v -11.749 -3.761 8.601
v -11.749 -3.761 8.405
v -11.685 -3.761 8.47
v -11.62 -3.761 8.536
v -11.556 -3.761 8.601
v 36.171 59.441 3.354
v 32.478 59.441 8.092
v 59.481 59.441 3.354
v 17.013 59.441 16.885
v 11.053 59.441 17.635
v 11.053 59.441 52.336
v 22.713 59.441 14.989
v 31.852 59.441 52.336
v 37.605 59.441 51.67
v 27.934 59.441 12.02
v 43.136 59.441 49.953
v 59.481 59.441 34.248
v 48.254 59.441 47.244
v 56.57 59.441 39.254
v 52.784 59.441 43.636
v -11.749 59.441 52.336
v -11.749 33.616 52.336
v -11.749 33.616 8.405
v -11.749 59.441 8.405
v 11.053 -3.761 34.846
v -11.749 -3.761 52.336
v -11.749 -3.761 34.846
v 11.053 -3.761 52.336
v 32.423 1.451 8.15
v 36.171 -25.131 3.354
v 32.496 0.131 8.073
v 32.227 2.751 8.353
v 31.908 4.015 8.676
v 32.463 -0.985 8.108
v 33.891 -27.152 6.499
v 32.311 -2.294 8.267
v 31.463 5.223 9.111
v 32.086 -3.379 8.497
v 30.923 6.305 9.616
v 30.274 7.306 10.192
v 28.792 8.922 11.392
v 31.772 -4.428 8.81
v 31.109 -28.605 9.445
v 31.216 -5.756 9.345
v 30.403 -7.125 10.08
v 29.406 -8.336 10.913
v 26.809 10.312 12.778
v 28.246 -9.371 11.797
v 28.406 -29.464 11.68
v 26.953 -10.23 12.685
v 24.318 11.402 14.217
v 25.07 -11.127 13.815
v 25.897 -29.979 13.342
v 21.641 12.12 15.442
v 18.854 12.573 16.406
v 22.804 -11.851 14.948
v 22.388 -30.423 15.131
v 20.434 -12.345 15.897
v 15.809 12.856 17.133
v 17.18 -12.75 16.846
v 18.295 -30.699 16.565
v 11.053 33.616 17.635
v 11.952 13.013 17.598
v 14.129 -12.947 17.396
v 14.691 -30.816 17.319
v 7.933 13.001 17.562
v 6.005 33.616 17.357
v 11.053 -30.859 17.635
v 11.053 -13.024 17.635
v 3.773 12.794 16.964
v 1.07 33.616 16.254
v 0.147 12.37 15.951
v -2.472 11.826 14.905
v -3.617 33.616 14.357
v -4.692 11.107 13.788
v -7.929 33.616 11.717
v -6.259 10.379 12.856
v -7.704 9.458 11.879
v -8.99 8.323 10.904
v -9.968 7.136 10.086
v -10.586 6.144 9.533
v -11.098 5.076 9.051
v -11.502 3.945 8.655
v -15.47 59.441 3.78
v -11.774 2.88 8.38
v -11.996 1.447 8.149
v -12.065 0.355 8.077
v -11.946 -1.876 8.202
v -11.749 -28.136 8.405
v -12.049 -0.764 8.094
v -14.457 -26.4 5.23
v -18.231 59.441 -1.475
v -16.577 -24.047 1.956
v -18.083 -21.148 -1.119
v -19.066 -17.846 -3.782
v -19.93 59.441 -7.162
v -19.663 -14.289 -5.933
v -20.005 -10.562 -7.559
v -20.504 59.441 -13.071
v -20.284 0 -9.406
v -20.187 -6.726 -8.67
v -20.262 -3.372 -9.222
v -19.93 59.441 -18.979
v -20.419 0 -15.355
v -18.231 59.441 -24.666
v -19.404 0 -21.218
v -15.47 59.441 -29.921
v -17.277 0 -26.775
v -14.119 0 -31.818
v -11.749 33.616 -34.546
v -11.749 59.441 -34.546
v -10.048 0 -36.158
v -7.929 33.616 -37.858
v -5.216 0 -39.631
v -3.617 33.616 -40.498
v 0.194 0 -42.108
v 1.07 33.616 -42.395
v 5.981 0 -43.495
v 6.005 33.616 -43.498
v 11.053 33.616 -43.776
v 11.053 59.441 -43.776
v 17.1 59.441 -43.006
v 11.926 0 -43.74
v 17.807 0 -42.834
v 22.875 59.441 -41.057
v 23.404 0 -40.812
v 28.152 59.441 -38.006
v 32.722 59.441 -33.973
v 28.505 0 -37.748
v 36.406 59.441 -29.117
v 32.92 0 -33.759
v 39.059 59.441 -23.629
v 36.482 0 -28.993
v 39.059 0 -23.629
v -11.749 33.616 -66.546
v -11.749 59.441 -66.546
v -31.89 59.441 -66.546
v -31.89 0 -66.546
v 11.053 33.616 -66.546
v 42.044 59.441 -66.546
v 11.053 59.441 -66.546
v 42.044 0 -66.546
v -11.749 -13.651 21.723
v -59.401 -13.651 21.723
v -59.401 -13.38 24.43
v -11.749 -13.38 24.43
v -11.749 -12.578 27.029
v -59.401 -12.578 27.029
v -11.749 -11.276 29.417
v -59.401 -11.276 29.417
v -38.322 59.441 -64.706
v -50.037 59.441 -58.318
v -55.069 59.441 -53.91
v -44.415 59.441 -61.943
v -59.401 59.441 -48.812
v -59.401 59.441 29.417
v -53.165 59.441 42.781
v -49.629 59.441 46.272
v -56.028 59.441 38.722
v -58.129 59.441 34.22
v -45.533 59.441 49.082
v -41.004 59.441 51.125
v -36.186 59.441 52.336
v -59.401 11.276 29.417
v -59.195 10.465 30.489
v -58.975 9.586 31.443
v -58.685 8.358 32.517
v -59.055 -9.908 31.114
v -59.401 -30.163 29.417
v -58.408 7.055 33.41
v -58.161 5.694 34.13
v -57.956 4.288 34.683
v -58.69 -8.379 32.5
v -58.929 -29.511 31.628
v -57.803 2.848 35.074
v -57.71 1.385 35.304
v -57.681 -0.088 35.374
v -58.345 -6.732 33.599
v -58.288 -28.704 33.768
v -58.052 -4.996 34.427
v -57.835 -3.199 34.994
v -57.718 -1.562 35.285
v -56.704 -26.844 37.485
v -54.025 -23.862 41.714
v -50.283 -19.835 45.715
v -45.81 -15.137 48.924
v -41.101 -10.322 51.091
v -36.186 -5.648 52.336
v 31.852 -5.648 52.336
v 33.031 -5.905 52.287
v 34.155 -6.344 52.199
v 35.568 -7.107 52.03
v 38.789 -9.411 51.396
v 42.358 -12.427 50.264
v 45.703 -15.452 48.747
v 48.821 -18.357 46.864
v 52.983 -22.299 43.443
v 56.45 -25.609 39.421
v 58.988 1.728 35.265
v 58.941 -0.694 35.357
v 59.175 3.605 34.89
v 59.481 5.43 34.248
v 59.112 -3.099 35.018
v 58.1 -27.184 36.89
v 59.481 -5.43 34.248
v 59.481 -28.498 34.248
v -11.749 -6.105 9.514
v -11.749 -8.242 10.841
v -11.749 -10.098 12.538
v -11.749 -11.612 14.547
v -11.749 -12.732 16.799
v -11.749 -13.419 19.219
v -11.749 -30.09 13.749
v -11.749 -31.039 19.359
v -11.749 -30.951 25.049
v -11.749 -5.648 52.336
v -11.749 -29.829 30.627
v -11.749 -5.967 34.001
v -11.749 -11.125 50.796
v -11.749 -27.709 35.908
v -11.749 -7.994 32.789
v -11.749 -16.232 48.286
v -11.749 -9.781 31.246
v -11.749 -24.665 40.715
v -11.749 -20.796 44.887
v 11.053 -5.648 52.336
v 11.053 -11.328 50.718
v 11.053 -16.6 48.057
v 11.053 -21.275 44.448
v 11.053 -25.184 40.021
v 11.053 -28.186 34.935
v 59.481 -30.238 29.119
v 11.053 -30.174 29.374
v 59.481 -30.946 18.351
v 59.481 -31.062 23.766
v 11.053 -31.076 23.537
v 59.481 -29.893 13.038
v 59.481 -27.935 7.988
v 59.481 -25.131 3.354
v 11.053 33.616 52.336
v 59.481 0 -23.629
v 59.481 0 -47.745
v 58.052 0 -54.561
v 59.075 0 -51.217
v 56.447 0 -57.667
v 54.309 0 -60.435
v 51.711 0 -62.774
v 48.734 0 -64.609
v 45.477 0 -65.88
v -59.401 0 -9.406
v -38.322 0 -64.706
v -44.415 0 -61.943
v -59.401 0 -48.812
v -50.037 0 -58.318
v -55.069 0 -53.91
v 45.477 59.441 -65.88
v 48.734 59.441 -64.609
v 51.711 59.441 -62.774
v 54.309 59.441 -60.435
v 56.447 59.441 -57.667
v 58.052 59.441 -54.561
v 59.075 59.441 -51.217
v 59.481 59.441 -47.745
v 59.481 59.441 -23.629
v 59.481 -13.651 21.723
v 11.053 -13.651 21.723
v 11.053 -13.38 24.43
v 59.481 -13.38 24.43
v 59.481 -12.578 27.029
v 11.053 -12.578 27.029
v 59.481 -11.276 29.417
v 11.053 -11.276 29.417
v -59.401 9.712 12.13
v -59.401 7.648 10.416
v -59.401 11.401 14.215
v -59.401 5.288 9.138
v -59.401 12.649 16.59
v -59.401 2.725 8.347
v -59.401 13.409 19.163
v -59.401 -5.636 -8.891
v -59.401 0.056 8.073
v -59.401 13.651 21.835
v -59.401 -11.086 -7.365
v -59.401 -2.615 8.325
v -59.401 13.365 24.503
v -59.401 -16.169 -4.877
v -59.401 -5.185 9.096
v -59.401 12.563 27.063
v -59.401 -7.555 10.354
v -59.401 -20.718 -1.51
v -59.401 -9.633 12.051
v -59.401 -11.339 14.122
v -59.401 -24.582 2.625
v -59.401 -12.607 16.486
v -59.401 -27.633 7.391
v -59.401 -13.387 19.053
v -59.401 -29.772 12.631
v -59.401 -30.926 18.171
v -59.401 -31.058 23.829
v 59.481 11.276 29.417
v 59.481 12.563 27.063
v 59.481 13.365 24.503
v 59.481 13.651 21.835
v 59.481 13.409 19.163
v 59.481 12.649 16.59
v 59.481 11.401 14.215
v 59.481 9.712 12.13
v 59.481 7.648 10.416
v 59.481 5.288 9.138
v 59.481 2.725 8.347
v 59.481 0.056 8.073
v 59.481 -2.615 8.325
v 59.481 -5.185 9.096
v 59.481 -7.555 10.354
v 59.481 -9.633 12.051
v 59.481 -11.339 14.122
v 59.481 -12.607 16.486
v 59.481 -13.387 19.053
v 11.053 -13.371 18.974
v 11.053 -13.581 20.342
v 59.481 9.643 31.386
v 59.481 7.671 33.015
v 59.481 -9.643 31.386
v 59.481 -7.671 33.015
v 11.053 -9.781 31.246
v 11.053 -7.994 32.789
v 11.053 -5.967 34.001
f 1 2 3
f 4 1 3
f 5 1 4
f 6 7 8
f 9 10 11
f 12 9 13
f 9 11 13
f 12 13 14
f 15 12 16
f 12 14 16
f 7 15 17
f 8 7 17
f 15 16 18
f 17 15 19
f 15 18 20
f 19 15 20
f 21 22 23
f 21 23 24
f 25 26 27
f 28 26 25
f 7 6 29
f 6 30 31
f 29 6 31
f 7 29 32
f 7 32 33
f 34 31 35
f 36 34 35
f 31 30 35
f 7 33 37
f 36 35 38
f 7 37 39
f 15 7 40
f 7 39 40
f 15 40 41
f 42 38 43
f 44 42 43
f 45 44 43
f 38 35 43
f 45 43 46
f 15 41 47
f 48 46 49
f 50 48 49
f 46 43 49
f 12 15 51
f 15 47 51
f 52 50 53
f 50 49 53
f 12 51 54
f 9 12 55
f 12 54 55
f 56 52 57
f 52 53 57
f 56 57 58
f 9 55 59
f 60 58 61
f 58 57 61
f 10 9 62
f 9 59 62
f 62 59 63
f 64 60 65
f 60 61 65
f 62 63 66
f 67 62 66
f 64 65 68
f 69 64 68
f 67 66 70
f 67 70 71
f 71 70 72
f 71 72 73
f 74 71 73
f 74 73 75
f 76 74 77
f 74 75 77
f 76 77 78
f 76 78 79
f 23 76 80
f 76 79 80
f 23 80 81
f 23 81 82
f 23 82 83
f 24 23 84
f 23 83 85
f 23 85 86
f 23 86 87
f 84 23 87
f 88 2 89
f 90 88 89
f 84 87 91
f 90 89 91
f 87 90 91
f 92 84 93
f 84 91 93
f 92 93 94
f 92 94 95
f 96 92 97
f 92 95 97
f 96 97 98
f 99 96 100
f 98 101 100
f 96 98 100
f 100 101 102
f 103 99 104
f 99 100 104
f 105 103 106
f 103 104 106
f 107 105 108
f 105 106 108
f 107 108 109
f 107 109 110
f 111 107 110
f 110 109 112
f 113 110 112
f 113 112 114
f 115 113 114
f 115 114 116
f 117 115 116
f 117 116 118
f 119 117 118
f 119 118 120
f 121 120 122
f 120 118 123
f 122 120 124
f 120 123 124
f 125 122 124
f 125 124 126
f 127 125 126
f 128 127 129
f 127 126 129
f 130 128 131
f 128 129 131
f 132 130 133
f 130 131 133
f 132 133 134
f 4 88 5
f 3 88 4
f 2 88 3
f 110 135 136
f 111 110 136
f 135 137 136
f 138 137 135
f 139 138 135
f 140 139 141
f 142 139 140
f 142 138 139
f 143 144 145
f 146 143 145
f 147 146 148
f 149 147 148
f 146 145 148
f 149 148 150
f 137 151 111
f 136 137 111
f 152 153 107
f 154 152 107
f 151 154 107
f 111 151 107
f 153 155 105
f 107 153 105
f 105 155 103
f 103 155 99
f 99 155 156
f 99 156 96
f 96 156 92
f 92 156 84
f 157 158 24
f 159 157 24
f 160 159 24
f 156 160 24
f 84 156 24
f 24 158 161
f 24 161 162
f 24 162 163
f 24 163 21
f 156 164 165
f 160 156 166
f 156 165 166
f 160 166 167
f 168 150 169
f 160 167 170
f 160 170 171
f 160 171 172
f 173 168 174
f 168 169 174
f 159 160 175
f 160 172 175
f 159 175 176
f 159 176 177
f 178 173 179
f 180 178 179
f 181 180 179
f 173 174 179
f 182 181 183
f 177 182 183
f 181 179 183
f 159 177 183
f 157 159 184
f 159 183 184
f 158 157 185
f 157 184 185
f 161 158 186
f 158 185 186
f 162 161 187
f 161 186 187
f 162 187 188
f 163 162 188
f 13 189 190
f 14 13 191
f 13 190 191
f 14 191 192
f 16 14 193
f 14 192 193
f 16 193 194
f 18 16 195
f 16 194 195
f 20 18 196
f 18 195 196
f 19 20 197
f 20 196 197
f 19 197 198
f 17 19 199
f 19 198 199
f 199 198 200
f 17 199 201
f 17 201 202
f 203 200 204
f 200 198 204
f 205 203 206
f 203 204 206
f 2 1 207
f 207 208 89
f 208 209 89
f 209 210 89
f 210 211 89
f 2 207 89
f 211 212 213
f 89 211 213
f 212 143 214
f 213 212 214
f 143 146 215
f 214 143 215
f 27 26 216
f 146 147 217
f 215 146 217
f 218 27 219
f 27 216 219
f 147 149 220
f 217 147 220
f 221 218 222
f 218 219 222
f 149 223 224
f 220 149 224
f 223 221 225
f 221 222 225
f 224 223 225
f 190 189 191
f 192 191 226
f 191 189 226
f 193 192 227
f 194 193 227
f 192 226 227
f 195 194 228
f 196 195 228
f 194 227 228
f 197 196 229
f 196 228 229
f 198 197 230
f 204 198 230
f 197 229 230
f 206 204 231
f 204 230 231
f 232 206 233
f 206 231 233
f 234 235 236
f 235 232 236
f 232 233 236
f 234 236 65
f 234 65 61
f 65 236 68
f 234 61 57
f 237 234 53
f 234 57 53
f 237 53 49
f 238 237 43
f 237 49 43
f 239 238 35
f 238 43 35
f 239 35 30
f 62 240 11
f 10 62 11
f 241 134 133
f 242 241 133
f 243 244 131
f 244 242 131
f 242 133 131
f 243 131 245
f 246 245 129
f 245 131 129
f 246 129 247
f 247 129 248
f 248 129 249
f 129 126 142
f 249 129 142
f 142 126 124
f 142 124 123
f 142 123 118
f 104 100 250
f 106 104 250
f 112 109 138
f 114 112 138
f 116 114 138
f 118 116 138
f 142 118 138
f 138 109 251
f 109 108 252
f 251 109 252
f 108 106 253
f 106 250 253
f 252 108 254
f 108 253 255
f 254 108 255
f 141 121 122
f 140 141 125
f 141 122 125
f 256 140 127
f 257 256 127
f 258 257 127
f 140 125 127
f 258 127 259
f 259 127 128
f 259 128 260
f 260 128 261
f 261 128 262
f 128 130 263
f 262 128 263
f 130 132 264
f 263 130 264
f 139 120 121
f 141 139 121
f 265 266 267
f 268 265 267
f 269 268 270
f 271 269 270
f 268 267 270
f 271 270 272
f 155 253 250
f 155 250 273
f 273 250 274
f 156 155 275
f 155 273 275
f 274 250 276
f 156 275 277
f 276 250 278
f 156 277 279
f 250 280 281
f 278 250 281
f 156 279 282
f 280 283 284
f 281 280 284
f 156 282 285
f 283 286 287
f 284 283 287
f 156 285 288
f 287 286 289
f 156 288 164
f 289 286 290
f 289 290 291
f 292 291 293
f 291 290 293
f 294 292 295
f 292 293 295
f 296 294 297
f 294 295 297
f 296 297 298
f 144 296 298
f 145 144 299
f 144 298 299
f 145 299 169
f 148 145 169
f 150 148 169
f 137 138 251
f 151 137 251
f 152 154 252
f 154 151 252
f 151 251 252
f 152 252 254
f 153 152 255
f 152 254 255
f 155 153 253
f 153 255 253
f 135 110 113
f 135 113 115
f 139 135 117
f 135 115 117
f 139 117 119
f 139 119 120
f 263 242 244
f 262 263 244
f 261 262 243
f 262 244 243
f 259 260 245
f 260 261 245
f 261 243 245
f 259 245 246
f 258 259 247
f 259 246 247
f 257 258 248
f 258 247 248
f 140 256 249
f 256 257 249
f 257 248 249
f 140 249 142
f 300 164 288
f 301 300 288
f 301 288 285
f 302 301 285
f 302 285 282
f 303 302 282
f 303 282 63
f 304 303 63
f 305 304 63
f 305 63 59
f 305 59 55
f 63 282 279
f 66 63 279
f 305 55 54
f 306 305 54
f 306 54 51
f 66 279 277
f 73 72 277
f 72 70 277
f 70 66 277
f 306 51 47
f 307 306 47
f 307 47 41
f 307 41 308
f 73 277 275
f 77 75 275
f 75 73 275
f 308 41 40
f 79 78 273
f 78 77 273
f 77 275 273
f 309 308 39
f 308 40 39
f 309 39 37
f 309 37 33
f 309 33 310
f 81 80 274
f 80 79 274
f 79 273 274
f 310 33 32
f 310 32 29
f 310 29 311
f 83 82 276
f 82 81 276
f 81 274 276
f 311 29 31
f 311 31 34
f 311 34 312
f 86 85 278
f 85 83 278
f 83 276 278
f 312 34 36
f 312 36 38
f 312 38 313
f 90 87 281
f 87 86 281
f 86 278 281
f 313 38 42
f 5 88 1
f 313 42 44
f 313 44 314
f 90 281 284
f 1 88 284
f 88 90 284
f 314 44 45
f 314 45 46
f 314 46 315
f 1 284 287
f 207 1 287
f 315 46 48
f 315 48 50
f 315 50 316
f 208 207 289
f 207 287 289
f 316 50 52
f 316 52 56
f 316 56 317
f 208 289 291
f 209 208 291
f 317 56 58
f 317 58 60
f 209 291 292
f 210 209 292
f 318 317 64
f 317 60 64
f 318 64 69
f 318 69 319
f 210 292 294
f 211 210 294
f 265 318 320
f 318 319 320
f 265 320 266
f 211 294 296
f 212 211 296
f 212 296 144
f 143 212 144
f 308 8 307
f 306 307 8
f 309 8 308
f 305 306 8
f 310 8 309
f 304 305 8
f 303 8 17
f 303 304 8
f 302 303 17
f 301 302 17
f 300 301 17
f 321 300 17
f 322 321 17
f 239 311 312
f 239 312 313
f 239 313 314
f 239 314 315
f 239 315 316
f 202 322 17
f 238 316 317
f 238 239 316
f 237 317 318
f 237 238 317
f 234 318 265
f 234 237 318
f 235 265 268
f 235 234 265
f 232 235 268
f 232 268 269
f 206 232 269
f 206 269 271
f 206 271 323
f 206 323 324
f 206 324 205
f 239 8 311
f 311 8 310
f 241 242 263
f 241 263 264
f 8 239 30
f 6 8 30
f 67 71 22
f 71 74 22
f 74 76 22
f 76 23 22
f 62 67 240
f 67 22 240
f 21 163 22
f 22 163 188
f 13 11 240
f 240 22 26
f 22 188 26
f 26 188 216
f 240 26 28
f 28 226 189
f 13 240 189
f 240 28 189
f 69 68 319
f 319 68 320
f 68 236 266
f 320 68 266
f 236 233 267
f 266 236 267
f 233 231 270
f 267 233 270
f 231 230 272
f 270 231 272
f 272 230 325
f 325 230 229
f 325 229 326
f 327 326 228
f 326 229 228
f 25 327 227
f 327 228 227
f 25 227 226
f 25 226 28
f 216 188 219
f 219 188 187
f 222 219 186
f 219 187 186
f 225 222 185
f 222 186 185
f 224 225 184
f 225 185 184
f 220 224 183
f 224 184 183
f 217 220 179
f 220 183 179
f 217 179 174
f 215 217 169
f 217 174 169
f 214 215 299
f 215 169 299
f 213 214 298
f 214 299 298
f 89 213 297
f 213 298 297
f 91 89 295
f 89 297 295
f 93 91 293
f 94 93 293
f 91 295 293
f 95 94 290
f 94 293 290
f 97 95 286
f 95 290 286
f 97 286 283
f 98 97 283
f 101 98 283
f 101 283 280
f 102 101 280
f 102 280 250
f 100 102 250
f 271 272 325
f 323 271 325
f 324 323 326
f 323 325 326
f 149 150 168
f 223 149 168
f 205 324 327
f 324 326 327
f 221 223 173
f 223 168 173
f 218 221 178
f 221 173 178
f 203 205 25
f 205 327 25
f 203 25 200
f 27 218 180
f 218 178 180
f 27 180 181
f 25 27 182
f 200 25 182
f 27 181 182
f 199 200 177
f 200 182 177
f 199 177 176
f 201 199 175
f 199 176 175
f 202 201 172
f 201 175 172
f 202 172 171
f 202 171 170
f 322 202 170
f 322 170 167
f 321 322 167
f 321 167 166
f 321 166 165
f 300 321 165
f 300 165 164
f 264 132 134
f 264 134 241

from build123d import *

# Parameters (mm, degrees)
F0_W          = 118.8822906261
F0_H          = 118.8822906261
F1_DEPTH      = 59.441
F1_DEPTH_BACK = 59.441
F3_DEPTH      = 118.883
F4_DEPTH      = 118.883
F5_DEPTH      = 118.883
F6_DEPTH      = 118.883
F8_DEPTH      = 118.8832906261
F9_W          = 22.8022392839
F9_H          = 25.8253251765
F9_H_2        = 1.8863490666
F10_DEPTH     = 118.8832906261


with BuildPart() as f1:
    # F0 (on Front) → F1 (new body, two sides)
    with BuildSketch(Plane.XZ) as f1_sk:
        with Locations((0.0400656936, -7.1052906933)):
            Rectangle(F0_W, F0_H)
    extrude(amount=F1_DEPTH)
    extrude(f1_sk.sketch, amount=-F1_DEPTH_BACK)

    # F2 (on face) → F3 (cut, through all)
    with BuildSketch(Plane.XZ.offset(59.441)):
        with BuildLine():
            Line((59.4812110066, -23.6291363835), (59.4812110066, 3.3540143631))
            Line((59.4812110066, 3.3540143631), (36.171077782, 3.3540143631))
            ThreePointArc((36.171077782, 3.3540143631), (-20.329200251, -16.339702262), (39.0592501624, -23.6291363835))
            Line((39.0592501624, -23.6291363835), (59.4812110066, -23.6291363835))
        make_face()
        with BuildLine():
            ThreePointArc((-59.4010796194, 29.4173564762), (-51.4744086785, 44.6051407739), (-36.1859500408, 52.3358546197))
            Line((-36.1859500408, 52.3358546197), (-59.4010796194, 52.3358546197))
            Line((-59.4010796194, 52.3358546197), (-59.4010796194, 29.4173564762))
        make_face()
    extrude(amount=-F3_DEPTH, mode=Mode.SUBTRACT)

    # F2 (on face) → F4 (cut, through all)
    with BuildSketch(Plane.XZ.offset(59.441)):
        with BuildLine():
            Line((59.4812110066, 52.3358546197), (31.8523161113, 52.3358546197))
            ThreePointArc((31.8523161113, 52.3358546197), (48.2543109443, 47.2441953068), (59.4812110066, 34.2477671802))
            Line((59.4812110066, 34.2477671802), (59.4812110066, 52.3358546197))
        make_face()
    extrude(amount=-F4_DEPTH, mode=Mode.SUBTRACT)

    # F2 (on face) → F5 (cut, through all)
    with BuildSketch(Plane.XZ.offset(59.441)):
        with BuildLine():
            ThreePointArc((-31.8904966116, -66.5464360063), (-47.2927113432, -60.2340029507), (-59.4010796194, -48.8119870424))
            Line((-59.4010796194, -48.8119870424), (-59.4010796194, -66.5464360063))
            Line((-59.4010796194, -66.5464360063), (-31.8904966116, -66.5464360063))
        make_face()
    extrude(amount=-F5_DEPTH, mode=Mode.SUBTRACT)

    # F2 (on face) → F6 (cut, through all)
    with BuildSketch(Plane.XZ.offset(59.441)):
        with BuildLine():
            ThreePointArc((59.4812110066, -47.7445162833), (54.3094541563, -60.4346481438), (42.0443587764, -66.5464360063))
            Line((42.0443587764, -66.5464360063), (59.4812110066, -66.5464360063))
            Line((59.4812110066, -66.5464360063), (59.4812110066, -47.7445162833))
        make_face()
    extrude(amount=-F6_DEPTH, mode=Mode.SUBTRACT)

    # F7 (on face) → F8 (cut, through all)
    with BuildSketch(Plane(origin=(-59.4010796194, 0, 0), x_dir=(0, -1, 0), z_dir=(-1, 0, 0))):
        with BuildLine():
            Line((0, -9.4056399539), (0, -48.8119870424))
            Line((0, -48.8119870424), (59.441, -48.8119870424))
            Line((59.441, -48.8119870424), (59.441, 29.4173564762))
            Line((59.441, 29.4173564762), (30.1632257603, 29.4173564762))
            ThreePointArc((30.1632257603, 29.4173564762), (24.581727157, 2.6248182068), (0, -9.4056399539))
        make_face()
        with BuildLine():
            Line((0, -48.8119870424), (0, -66.7257010937))
            Line((0, -66.7257010937), (59.7706362605, -66.7257010937))
            Line((59.7706362605, -66.7257010937), (59.441, 52.8524406254))
            Line((59.441, 52.8524406254), (0, 52.8524406254))
            ThreePointArc((0, 52.8524406254), (19.098582129, 46.3051274927), (30.1632257603, 29.4173564762))
            Line((30.1632257603, 29.4173564762), (59.441, 29.4173564762))
            Line((59.441, 29.4173564762), (59.441, -48.8119870424))
            Line((59.441, -48.8119870424), (0, -48.8119870424))
        make_face()
        with BuildLine():
            Line((-11.276206805, 29.4173564762), (11.276206805, 29.4173564762))
            ThreePointArc((11.276206805, 29.4173564762), (0, 35.3744003358), (-11.276206805, 29.4173564762))
        make_face()
        with BuildLine():
            ThreePointArc((13.651, 21.7234003358), (13.0437973784, 25.749459321), (11.276206805, 29.4173564762))
            Line((11.276206805, 29.4173564762), (-11.276206805, 29.4173564762))
            ThreePointArc((-11.276206805, 29.4173564762), (-4.0260589852, 8.6796029574), (13.651, 21.7234003358))
        make_face()
    extrude(amount=-F8_DEPTH, mode=Mode.SUBTRACT)

    # F9 (on face) → F10 (cut, through all)
    with BuildSketch(Plane.XY.offset(52.3358546197)):
        with Locations((-0.3479313365, 46.5283374118)):
            Rectangle(F9_W, F9_H)
        with Locations((-0.3479313365, -4.7043729049)):
            Rectangle(F9_W, F9_H_2)
        Polygon((-11.7490509785, -5.6475474382), (-11.7490509785, -48.8955229521), (11.0531883055, -48.660453409), (11.0531883055, -5.6475474382), align=None)
    extrude(amount=-F10_DEPTH, mode=Mode.SUBTRACT)


solid = f1.part
